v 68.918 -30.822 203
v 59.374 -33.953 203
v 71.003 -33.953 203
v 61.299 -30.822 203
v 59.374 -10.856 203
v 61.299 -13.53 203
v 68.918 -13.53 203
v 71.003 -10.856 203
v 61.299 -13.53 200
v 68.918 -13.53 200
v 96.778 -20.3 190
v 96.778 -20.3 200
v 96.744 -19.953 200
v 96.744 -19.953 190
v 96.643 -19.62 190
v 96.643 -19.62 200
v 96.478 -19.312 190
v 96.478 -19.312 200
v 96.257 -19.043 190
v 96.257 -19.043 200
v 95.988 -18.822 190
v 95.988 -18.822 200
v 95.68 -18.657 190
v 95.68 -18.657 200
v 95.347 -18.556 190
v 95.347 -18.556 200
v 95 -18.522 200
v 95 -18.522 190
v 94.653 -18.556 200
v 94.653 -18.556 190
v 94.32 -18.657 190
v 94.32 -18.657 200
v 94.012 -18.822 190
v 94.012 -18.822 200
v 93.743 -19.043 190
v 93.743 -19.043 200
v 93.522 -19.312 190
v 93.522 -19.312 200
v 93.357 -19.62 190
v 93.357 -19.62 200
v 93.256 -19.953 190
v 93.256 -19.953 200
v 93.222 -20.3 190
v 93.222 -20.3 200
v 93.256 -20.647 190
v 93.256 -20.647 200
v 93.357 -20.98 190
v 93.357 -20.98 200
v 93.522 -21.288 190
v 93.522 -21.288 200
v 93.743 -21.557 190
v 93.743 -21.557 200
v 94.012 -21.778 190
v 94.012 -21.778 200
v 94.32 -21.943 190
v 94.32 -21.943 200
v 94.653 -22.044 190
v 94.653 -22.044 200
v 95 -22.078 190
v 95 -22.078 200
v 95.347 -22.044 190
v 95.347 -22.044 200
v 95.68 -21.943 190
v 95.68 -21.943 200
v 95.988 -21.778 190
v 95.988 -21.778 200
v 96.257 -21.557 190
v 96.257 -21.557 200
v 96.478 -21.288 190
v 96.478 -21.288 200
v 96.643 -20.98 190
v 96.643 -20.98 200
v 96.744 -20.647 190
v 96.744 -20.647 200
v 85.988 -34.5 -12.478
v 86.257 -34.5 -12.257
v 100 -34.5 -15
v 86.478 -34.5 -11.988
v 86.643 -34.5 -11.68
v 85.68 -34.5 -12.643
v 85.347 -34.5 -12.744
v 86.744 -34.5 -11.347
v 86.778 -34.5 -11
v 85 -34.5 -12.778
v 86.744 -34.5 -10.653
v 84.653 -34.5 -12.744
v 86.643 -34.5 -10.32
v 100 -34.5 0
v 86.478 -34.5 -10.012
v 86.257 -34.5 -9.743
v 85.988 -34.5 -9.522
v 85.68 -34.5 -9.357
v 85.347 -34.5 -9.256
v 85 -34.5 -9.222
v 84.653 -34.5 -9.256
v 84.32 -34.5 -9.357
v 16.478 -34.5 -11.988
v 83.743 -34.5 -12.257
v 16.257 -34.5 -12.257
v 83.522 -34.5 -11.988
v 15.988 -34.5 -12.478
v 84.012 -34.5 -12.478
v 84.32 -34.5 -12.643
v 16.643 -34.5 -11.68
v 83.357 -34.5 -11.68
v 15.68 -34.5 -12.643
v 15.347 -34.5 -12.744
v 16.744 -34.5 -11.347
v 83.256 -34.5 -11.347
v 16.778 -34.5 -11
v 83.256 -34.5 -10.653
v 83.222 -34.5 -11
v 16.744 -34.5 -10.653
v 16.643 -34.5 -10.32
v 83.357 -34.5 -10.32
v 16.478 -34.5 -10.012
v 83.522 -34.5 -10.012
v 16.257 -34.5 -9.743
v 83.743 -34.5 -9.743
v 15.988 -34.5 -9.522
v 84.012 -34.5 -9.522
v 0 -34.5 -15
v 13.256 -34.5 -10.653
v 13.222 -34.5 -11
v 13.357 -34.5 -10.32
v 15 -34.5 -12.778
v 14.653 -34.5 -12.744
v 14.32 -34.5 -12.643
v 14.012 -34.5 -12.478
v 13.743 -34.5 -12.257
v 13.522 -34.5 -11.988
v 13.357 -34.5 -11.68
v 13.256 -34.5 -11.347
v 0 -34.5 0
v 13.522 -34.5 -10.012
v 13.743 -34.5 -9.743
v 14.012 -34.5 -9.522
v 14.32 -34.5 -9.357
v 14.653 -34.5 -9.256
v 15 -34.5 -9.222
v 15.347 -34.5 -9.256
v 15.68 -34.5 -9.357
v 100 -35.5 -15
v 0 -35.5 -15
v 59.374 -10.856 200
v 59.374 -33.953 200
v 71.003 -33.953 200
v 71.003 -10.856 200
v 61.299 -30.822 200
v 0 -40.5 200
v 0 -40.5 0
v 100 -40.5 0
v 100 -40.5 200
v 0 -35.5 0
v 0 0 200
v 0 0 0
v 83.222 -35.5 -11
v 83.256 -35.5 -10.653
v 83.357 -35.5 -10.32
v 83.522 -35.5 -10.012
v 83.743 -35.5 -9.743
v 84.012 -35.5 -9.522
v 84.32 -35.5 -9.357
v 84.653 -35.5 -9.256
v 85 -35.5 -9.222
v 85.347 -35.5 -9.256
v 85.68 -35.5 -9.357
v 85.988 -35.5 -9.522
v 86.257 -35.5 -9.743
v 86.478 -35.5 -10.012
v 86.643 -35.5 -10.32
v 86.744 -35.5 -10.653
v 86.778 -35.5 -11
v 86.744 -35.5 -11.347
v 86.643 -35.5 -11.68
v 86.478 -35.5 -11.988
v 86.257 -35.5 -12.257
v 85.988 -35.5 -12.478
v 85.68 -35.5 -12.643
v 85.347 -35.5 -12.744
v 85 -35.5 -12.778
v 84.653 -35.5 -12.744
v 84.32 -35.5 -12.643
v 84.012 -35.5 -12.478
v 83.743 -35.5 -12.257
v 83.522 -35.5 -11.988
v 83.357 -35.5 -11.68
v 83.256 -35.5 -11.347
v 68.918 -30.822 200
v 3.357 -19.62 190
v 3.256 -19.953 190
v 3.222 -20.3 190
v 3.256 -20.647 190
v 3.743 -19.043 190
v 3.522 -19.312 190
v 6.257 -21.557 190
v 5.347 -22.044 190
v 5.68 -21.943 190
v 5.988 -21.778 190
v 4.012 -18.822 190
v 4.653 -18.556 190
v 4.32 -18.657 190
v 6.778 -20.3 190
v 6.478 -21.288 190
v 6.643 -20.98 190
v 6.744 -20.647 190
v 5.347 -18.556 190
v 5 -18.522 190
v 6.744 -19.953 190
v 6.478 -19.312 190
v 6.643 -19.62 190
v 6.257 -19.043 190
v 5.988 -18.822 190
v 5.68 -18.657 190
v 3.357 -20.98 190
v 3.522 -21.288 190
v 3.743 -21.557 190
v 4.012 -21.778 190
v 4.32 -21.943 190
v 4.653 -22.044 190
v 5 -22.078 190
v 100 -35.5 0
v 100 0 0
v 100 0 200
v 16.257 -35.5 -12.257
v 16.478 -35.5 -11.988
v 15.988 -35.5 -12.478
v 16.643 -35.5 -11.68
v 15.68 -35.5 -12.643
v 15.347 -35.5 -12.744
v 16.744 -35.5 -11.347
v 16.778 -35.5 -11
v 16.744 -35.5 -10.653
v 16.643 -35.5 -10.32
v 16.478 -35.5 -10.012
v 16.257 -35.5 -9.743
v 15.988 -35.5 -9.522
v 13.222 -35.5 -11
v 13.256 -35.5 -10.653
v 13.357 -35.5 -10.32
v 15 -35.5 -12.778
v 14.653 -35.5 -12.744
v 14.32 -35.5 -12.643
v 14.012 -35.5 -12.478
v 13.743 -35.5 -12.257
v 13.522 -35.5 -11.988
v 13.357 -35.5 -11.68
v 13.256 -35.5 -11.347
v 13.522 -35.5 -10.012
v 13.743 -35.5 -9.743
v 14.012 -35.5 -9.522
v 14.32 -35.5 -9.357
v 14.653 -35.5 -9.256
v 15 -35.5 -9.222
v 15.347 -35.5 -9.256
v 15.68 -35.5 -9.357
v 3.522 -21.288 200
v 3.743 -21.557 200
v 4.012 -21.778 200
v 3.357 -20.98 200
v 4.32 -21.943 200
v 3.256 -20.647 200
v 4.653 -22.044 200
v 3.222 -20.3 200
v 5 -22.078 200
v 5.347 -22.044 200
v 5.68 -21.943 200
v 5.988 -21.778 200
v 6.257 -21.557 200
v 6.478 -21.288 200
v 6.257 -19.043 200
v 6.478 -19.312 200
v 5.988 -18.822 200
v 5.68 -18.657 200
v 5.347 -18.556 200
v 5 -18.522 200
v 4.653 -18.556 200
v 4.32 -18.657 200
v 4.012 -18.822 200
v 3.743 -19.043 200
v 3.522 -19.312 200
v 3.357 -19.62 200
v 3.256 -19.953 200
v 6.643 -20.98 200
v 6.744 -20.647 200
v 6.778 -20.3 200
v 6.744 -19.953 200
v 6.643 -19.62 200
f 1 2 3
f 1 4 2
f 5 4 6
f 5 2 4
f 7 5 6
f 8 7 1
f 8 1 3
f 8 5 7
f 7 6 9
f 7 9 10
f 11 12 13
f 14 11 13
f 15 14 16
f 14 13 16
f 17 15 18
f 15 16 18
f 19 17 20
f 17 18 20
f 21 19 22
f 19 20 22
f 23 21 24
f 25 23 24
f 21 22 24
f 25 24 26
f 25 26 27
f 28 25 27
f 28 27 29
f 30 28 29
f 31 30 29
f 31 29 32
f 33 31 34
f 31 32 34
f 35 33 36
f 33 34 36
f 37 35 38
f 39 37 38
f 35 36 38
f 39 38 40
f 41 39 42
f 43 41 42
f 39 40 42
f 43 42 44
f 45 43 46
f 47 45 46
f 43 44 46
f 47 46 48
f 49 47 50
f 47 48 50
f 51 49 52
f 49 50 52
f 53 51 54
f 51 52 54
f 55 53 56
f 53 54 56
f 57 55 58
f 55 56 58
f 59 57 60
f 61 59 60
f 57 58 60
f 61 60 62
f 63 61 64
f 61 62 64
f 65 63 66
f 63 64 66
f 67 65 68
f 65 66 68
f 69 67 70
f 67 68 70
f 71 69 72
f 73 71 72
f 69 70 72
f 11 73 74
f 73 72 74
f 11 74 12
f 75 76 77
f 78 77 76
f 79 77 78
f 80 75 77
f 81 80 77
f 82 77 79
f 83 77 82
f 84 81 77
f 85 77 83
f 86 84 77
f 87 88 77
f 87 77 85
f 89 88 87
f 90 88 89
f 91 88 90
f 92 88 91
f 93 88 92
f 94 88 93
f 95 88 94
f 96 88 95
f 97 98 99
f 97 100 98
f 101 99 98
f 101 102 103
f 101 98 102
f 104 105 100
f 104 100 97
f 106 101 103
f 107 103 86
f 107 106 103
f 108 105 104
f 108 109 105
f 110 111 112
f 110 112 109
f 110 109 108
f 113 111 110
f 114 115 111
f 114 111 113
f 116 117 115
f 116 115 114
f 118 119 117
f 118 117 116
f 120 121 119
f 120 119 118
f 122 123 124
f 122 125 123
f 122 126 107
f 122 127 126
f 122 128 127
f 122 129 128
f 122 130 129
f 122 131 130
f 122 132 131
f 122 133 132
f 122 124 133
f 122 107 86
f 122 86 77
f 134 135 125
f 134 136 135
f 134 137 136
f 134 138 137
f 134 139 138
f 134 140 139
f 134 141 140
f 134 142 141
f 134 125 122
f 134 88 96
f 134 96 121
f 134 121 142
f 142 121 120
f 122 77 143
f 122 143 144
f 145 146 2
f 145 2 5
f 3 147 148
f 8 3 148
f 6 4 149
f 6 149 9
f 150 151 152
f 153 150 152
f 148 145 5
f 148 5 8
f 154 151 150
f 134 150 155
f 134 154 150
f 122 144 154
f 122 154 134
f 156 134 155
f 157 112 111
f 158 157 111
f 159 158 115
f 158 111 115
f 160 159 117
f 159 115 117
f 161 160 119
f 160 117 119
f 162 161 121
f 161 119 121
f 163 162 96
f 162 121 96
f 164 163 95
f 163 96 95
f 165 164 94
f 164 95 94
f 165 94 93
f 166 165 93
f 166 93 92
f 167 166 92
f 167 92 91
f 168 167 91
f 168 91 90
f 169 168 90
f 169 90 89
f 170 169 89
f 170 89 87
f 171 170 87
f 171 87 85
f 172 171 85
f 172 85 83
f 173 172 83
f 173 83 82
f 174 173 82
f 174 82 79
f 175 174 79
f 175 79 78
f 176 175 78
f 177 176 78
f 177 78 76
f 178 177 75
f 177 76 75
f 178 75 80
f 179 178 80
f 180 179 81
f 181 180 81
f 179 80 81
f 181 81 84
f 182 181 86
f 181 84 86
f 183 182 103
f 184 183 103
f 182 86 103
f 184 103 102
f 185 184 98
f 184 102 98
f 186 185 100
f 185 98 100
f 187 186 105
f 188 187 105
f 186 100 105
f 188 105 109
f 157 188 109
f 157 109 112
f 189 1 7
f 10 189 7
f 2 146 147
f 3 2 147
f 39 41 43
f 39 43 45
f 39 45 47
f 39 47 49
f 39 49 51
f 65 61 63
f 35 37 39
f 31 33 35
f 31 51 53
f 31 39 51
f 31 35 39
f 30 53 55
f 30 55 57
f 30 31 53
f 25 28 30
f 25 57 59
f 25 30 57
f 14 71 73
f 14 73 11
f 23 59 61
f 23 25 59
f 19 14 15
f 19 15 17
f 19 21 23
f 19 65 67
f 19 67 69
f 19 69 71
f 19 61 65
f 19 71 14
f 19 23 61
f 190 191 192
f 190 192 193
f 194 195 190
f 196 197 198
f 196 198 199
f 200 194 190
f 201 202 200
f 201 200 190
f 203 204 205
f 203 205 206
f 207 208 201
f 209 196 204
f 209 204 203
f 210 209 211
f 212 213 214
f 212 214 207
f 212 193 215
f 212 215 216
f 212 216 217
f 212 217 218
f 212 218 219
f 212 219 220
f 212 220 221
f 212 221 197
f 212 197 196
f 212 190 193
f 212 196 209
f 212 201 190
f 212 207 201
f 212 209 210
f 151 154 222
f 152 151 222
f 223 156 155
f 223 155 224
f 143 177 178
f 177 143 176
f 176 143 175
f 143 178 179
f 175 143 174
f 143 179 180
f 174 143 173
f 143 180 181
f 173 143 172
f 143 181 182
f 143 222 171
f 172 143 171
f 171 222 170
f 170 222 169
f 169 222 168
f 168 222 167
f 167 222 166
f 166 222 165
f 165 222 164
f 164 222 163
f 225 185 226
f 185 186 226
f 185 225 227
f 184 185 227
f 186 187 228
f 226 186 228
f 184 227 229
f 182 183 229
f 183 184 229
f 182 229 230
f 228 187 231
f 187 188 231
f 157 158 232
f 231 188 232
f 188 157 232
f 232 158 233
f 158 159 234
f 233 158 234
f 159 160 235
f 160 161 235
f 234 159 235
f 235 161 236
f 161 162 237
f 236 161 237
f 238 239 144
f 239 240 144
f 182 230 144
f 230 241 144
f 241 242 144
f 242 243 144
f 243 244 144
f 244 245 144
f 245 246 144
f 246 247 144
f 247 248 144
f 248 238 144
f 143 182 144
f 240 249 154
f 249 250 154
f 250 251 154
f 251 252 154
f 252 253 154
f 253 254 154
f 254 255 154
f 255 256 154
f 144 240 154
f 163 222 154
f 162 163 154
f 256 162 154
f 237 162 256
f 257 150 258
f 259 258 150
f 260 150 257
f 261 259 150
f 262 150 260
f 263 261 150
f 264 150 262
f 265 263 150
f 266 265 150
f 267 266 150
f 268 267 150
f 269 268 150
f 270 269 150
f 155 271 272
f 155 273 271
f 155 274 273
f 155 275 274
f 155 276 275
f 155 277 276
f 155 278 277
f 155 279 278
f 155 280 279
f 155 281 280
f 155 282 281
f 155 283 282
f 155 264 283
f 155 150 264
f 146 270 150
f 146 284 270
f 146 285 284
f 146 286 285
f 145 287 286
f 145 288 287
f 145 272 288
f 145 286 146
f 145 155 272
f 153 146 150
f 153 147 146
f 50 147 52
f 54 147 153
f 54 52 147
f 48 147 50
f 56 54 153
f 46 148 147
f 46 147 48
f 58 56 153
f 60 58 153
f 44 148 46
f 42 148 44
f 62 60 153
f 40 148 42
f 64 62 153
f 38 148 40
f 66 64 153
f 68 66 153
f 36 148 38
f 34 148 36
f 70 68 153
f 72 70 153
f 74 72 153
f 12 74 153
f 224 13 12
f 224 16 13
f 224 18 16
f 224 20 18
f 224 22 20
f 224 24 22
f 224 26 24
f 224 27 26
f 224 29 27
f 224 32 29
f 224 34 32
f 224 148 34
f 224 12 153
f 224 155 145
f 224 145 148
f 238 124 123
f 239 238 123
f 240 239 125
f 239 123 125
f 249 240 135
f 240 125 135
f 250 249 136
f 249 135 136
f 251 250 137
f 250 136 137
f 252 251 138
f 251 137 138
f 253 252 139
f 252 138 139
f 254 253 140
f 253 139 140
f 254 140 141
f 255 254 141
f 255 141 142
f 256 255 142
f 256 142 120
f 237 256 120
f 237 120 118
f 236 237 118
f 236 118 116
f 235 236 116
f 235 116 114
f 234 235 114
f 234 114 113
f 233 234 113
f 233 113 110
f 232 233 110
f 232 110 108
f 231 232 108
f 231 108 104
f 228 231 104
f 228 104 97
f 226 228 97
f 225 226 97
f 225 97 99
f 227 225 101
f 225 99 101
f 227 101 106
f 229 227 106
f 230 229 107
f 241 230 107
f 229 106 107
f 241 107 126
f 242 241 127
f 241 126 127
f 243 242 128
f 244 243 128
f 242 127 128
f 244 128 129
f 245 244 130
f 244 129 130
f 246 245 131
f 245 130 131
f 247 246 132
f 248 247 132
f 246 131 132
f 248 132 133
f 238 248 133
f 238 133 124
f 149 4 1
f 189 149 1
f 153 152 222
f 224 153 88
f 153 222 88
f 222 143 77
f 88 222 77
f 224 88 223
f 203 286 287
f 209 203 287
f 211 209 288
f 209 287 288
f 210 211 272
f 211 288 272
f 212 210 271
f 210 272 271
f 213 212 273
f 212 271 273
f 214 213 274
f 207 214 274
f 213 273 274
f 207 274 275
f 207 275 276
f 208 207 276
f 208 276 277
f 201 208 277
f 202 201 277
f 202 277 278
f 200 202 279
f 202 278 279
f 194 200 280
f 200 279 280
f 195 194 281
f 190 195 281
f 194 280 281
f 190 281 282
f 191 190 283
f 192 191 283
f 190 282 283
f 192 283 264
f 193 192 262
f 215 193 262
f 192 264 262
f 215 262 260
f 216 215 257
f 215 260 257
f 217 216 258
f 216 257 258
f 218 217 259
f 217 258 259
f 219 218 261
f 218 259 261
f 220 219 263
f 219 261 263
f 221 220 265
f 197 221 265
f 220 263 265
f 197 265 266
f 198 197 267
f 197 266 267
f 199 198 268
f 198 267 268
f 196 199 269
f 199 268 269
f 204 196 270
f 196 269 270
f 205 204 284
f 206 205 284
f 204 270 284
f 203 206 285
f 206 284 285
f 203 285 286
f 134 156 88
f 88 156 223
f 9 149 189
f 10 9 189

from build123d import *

# Parameters (mm, degrees)
SKETCH1_W          = 100
SKETCH1_H          = 40.5
EXTRUDE1_DEPTH     = 200
SKETCH2_R          = 1.778
CUT_EXTRUDE1_DEPTH = 10
SKETCH3_W          = 100
SKETCH3_H          = 1
EXTRUDE2_DEPTH     = 15
SKETCH4_R          = 1.778
CUT_EXTRUDE2_DEPTH = 15
SKETCH5_W          = 11.629297252
SKETCH5_H          = 23.097430101
EXTRUDE3_DEPTH     = 3
SKETCH6_W          = 7.618566084
SKETCH6_H          = 17.291576956
CUT_EXTRUDE3_DEPTH = 3


with BuildPart() as part:
    # Sketch1 → Extrude1 (new body)
    with BuildSketch(Plane.XY):
        with Locations((50, -20.25)):
            Rectangle(SKETCH1_W, SKETCH1_H)
    extrude(amount=EXTRUDE1_DEPTH)

    # Sketch2 → Cut-Extrude1 (cut)
    with BuildSketch(Plane.XY.offset(200)):
        with Locations((95, -20.3)):
            Circle(SKETCH2_R)
        with Locations((5, -20.3)):
            Circle(SKETCH2_R)
    extrude(amount=-CUT_EXTRUDE1_DEPTH, mode=Mode.SUBTRACT)

    # Sketch3 → Extrude2 (add)
    with BuildSketch(Plane(origin=(0, 0, 0), x_dir=(-1, 0, 0), z_dir=(0, 0, -1))):
        with Locations((-50, -35)):
            Rectangle(SKETCH3_W, SKETCH3_H)
    extrude(amount=EXTRUDE2_DEPTH)

    # Sketch4 → Cut-Extrude2 (cut)
    with BuildSketch(Plane(origin=(0, -34.5, 0), x_dir=(-1, 0, 0), z_dir=(0, 1, 0))):
        with Locations((-15, -11)):
            Circle(SKETCH4_R)
        with Locations((-85, -11)):
            Circle(SKETCH4_R)
    extrude(amount=-CUT_EXTRUDE2_DEPTH, mode=Mode.SUBTRACT)

    # Sketch5 → Extrude3 (add)
    with BuildSketch(Plane.XY.offset(200)):
        with Locations((65.188803726, -22.404247031)):
            Rectangle(SKETCH5_W, SKETCH5_H)
    extrude(amount=EXTRUDE3_DEPTH)

    # Sketch6 → Cut-Extrude3 (cut)
    with BuildSketch(Plane.XY.offset(203)):
        with Locations((65.10872937, -22.176041988)):
            Rectangle(SKETCH6_W, SKETCH6_H)
    extrude(amount=-CUT_EXTRUDE3_DEPTH, mode=Mode.SUBTRACT)


solid = part.part
